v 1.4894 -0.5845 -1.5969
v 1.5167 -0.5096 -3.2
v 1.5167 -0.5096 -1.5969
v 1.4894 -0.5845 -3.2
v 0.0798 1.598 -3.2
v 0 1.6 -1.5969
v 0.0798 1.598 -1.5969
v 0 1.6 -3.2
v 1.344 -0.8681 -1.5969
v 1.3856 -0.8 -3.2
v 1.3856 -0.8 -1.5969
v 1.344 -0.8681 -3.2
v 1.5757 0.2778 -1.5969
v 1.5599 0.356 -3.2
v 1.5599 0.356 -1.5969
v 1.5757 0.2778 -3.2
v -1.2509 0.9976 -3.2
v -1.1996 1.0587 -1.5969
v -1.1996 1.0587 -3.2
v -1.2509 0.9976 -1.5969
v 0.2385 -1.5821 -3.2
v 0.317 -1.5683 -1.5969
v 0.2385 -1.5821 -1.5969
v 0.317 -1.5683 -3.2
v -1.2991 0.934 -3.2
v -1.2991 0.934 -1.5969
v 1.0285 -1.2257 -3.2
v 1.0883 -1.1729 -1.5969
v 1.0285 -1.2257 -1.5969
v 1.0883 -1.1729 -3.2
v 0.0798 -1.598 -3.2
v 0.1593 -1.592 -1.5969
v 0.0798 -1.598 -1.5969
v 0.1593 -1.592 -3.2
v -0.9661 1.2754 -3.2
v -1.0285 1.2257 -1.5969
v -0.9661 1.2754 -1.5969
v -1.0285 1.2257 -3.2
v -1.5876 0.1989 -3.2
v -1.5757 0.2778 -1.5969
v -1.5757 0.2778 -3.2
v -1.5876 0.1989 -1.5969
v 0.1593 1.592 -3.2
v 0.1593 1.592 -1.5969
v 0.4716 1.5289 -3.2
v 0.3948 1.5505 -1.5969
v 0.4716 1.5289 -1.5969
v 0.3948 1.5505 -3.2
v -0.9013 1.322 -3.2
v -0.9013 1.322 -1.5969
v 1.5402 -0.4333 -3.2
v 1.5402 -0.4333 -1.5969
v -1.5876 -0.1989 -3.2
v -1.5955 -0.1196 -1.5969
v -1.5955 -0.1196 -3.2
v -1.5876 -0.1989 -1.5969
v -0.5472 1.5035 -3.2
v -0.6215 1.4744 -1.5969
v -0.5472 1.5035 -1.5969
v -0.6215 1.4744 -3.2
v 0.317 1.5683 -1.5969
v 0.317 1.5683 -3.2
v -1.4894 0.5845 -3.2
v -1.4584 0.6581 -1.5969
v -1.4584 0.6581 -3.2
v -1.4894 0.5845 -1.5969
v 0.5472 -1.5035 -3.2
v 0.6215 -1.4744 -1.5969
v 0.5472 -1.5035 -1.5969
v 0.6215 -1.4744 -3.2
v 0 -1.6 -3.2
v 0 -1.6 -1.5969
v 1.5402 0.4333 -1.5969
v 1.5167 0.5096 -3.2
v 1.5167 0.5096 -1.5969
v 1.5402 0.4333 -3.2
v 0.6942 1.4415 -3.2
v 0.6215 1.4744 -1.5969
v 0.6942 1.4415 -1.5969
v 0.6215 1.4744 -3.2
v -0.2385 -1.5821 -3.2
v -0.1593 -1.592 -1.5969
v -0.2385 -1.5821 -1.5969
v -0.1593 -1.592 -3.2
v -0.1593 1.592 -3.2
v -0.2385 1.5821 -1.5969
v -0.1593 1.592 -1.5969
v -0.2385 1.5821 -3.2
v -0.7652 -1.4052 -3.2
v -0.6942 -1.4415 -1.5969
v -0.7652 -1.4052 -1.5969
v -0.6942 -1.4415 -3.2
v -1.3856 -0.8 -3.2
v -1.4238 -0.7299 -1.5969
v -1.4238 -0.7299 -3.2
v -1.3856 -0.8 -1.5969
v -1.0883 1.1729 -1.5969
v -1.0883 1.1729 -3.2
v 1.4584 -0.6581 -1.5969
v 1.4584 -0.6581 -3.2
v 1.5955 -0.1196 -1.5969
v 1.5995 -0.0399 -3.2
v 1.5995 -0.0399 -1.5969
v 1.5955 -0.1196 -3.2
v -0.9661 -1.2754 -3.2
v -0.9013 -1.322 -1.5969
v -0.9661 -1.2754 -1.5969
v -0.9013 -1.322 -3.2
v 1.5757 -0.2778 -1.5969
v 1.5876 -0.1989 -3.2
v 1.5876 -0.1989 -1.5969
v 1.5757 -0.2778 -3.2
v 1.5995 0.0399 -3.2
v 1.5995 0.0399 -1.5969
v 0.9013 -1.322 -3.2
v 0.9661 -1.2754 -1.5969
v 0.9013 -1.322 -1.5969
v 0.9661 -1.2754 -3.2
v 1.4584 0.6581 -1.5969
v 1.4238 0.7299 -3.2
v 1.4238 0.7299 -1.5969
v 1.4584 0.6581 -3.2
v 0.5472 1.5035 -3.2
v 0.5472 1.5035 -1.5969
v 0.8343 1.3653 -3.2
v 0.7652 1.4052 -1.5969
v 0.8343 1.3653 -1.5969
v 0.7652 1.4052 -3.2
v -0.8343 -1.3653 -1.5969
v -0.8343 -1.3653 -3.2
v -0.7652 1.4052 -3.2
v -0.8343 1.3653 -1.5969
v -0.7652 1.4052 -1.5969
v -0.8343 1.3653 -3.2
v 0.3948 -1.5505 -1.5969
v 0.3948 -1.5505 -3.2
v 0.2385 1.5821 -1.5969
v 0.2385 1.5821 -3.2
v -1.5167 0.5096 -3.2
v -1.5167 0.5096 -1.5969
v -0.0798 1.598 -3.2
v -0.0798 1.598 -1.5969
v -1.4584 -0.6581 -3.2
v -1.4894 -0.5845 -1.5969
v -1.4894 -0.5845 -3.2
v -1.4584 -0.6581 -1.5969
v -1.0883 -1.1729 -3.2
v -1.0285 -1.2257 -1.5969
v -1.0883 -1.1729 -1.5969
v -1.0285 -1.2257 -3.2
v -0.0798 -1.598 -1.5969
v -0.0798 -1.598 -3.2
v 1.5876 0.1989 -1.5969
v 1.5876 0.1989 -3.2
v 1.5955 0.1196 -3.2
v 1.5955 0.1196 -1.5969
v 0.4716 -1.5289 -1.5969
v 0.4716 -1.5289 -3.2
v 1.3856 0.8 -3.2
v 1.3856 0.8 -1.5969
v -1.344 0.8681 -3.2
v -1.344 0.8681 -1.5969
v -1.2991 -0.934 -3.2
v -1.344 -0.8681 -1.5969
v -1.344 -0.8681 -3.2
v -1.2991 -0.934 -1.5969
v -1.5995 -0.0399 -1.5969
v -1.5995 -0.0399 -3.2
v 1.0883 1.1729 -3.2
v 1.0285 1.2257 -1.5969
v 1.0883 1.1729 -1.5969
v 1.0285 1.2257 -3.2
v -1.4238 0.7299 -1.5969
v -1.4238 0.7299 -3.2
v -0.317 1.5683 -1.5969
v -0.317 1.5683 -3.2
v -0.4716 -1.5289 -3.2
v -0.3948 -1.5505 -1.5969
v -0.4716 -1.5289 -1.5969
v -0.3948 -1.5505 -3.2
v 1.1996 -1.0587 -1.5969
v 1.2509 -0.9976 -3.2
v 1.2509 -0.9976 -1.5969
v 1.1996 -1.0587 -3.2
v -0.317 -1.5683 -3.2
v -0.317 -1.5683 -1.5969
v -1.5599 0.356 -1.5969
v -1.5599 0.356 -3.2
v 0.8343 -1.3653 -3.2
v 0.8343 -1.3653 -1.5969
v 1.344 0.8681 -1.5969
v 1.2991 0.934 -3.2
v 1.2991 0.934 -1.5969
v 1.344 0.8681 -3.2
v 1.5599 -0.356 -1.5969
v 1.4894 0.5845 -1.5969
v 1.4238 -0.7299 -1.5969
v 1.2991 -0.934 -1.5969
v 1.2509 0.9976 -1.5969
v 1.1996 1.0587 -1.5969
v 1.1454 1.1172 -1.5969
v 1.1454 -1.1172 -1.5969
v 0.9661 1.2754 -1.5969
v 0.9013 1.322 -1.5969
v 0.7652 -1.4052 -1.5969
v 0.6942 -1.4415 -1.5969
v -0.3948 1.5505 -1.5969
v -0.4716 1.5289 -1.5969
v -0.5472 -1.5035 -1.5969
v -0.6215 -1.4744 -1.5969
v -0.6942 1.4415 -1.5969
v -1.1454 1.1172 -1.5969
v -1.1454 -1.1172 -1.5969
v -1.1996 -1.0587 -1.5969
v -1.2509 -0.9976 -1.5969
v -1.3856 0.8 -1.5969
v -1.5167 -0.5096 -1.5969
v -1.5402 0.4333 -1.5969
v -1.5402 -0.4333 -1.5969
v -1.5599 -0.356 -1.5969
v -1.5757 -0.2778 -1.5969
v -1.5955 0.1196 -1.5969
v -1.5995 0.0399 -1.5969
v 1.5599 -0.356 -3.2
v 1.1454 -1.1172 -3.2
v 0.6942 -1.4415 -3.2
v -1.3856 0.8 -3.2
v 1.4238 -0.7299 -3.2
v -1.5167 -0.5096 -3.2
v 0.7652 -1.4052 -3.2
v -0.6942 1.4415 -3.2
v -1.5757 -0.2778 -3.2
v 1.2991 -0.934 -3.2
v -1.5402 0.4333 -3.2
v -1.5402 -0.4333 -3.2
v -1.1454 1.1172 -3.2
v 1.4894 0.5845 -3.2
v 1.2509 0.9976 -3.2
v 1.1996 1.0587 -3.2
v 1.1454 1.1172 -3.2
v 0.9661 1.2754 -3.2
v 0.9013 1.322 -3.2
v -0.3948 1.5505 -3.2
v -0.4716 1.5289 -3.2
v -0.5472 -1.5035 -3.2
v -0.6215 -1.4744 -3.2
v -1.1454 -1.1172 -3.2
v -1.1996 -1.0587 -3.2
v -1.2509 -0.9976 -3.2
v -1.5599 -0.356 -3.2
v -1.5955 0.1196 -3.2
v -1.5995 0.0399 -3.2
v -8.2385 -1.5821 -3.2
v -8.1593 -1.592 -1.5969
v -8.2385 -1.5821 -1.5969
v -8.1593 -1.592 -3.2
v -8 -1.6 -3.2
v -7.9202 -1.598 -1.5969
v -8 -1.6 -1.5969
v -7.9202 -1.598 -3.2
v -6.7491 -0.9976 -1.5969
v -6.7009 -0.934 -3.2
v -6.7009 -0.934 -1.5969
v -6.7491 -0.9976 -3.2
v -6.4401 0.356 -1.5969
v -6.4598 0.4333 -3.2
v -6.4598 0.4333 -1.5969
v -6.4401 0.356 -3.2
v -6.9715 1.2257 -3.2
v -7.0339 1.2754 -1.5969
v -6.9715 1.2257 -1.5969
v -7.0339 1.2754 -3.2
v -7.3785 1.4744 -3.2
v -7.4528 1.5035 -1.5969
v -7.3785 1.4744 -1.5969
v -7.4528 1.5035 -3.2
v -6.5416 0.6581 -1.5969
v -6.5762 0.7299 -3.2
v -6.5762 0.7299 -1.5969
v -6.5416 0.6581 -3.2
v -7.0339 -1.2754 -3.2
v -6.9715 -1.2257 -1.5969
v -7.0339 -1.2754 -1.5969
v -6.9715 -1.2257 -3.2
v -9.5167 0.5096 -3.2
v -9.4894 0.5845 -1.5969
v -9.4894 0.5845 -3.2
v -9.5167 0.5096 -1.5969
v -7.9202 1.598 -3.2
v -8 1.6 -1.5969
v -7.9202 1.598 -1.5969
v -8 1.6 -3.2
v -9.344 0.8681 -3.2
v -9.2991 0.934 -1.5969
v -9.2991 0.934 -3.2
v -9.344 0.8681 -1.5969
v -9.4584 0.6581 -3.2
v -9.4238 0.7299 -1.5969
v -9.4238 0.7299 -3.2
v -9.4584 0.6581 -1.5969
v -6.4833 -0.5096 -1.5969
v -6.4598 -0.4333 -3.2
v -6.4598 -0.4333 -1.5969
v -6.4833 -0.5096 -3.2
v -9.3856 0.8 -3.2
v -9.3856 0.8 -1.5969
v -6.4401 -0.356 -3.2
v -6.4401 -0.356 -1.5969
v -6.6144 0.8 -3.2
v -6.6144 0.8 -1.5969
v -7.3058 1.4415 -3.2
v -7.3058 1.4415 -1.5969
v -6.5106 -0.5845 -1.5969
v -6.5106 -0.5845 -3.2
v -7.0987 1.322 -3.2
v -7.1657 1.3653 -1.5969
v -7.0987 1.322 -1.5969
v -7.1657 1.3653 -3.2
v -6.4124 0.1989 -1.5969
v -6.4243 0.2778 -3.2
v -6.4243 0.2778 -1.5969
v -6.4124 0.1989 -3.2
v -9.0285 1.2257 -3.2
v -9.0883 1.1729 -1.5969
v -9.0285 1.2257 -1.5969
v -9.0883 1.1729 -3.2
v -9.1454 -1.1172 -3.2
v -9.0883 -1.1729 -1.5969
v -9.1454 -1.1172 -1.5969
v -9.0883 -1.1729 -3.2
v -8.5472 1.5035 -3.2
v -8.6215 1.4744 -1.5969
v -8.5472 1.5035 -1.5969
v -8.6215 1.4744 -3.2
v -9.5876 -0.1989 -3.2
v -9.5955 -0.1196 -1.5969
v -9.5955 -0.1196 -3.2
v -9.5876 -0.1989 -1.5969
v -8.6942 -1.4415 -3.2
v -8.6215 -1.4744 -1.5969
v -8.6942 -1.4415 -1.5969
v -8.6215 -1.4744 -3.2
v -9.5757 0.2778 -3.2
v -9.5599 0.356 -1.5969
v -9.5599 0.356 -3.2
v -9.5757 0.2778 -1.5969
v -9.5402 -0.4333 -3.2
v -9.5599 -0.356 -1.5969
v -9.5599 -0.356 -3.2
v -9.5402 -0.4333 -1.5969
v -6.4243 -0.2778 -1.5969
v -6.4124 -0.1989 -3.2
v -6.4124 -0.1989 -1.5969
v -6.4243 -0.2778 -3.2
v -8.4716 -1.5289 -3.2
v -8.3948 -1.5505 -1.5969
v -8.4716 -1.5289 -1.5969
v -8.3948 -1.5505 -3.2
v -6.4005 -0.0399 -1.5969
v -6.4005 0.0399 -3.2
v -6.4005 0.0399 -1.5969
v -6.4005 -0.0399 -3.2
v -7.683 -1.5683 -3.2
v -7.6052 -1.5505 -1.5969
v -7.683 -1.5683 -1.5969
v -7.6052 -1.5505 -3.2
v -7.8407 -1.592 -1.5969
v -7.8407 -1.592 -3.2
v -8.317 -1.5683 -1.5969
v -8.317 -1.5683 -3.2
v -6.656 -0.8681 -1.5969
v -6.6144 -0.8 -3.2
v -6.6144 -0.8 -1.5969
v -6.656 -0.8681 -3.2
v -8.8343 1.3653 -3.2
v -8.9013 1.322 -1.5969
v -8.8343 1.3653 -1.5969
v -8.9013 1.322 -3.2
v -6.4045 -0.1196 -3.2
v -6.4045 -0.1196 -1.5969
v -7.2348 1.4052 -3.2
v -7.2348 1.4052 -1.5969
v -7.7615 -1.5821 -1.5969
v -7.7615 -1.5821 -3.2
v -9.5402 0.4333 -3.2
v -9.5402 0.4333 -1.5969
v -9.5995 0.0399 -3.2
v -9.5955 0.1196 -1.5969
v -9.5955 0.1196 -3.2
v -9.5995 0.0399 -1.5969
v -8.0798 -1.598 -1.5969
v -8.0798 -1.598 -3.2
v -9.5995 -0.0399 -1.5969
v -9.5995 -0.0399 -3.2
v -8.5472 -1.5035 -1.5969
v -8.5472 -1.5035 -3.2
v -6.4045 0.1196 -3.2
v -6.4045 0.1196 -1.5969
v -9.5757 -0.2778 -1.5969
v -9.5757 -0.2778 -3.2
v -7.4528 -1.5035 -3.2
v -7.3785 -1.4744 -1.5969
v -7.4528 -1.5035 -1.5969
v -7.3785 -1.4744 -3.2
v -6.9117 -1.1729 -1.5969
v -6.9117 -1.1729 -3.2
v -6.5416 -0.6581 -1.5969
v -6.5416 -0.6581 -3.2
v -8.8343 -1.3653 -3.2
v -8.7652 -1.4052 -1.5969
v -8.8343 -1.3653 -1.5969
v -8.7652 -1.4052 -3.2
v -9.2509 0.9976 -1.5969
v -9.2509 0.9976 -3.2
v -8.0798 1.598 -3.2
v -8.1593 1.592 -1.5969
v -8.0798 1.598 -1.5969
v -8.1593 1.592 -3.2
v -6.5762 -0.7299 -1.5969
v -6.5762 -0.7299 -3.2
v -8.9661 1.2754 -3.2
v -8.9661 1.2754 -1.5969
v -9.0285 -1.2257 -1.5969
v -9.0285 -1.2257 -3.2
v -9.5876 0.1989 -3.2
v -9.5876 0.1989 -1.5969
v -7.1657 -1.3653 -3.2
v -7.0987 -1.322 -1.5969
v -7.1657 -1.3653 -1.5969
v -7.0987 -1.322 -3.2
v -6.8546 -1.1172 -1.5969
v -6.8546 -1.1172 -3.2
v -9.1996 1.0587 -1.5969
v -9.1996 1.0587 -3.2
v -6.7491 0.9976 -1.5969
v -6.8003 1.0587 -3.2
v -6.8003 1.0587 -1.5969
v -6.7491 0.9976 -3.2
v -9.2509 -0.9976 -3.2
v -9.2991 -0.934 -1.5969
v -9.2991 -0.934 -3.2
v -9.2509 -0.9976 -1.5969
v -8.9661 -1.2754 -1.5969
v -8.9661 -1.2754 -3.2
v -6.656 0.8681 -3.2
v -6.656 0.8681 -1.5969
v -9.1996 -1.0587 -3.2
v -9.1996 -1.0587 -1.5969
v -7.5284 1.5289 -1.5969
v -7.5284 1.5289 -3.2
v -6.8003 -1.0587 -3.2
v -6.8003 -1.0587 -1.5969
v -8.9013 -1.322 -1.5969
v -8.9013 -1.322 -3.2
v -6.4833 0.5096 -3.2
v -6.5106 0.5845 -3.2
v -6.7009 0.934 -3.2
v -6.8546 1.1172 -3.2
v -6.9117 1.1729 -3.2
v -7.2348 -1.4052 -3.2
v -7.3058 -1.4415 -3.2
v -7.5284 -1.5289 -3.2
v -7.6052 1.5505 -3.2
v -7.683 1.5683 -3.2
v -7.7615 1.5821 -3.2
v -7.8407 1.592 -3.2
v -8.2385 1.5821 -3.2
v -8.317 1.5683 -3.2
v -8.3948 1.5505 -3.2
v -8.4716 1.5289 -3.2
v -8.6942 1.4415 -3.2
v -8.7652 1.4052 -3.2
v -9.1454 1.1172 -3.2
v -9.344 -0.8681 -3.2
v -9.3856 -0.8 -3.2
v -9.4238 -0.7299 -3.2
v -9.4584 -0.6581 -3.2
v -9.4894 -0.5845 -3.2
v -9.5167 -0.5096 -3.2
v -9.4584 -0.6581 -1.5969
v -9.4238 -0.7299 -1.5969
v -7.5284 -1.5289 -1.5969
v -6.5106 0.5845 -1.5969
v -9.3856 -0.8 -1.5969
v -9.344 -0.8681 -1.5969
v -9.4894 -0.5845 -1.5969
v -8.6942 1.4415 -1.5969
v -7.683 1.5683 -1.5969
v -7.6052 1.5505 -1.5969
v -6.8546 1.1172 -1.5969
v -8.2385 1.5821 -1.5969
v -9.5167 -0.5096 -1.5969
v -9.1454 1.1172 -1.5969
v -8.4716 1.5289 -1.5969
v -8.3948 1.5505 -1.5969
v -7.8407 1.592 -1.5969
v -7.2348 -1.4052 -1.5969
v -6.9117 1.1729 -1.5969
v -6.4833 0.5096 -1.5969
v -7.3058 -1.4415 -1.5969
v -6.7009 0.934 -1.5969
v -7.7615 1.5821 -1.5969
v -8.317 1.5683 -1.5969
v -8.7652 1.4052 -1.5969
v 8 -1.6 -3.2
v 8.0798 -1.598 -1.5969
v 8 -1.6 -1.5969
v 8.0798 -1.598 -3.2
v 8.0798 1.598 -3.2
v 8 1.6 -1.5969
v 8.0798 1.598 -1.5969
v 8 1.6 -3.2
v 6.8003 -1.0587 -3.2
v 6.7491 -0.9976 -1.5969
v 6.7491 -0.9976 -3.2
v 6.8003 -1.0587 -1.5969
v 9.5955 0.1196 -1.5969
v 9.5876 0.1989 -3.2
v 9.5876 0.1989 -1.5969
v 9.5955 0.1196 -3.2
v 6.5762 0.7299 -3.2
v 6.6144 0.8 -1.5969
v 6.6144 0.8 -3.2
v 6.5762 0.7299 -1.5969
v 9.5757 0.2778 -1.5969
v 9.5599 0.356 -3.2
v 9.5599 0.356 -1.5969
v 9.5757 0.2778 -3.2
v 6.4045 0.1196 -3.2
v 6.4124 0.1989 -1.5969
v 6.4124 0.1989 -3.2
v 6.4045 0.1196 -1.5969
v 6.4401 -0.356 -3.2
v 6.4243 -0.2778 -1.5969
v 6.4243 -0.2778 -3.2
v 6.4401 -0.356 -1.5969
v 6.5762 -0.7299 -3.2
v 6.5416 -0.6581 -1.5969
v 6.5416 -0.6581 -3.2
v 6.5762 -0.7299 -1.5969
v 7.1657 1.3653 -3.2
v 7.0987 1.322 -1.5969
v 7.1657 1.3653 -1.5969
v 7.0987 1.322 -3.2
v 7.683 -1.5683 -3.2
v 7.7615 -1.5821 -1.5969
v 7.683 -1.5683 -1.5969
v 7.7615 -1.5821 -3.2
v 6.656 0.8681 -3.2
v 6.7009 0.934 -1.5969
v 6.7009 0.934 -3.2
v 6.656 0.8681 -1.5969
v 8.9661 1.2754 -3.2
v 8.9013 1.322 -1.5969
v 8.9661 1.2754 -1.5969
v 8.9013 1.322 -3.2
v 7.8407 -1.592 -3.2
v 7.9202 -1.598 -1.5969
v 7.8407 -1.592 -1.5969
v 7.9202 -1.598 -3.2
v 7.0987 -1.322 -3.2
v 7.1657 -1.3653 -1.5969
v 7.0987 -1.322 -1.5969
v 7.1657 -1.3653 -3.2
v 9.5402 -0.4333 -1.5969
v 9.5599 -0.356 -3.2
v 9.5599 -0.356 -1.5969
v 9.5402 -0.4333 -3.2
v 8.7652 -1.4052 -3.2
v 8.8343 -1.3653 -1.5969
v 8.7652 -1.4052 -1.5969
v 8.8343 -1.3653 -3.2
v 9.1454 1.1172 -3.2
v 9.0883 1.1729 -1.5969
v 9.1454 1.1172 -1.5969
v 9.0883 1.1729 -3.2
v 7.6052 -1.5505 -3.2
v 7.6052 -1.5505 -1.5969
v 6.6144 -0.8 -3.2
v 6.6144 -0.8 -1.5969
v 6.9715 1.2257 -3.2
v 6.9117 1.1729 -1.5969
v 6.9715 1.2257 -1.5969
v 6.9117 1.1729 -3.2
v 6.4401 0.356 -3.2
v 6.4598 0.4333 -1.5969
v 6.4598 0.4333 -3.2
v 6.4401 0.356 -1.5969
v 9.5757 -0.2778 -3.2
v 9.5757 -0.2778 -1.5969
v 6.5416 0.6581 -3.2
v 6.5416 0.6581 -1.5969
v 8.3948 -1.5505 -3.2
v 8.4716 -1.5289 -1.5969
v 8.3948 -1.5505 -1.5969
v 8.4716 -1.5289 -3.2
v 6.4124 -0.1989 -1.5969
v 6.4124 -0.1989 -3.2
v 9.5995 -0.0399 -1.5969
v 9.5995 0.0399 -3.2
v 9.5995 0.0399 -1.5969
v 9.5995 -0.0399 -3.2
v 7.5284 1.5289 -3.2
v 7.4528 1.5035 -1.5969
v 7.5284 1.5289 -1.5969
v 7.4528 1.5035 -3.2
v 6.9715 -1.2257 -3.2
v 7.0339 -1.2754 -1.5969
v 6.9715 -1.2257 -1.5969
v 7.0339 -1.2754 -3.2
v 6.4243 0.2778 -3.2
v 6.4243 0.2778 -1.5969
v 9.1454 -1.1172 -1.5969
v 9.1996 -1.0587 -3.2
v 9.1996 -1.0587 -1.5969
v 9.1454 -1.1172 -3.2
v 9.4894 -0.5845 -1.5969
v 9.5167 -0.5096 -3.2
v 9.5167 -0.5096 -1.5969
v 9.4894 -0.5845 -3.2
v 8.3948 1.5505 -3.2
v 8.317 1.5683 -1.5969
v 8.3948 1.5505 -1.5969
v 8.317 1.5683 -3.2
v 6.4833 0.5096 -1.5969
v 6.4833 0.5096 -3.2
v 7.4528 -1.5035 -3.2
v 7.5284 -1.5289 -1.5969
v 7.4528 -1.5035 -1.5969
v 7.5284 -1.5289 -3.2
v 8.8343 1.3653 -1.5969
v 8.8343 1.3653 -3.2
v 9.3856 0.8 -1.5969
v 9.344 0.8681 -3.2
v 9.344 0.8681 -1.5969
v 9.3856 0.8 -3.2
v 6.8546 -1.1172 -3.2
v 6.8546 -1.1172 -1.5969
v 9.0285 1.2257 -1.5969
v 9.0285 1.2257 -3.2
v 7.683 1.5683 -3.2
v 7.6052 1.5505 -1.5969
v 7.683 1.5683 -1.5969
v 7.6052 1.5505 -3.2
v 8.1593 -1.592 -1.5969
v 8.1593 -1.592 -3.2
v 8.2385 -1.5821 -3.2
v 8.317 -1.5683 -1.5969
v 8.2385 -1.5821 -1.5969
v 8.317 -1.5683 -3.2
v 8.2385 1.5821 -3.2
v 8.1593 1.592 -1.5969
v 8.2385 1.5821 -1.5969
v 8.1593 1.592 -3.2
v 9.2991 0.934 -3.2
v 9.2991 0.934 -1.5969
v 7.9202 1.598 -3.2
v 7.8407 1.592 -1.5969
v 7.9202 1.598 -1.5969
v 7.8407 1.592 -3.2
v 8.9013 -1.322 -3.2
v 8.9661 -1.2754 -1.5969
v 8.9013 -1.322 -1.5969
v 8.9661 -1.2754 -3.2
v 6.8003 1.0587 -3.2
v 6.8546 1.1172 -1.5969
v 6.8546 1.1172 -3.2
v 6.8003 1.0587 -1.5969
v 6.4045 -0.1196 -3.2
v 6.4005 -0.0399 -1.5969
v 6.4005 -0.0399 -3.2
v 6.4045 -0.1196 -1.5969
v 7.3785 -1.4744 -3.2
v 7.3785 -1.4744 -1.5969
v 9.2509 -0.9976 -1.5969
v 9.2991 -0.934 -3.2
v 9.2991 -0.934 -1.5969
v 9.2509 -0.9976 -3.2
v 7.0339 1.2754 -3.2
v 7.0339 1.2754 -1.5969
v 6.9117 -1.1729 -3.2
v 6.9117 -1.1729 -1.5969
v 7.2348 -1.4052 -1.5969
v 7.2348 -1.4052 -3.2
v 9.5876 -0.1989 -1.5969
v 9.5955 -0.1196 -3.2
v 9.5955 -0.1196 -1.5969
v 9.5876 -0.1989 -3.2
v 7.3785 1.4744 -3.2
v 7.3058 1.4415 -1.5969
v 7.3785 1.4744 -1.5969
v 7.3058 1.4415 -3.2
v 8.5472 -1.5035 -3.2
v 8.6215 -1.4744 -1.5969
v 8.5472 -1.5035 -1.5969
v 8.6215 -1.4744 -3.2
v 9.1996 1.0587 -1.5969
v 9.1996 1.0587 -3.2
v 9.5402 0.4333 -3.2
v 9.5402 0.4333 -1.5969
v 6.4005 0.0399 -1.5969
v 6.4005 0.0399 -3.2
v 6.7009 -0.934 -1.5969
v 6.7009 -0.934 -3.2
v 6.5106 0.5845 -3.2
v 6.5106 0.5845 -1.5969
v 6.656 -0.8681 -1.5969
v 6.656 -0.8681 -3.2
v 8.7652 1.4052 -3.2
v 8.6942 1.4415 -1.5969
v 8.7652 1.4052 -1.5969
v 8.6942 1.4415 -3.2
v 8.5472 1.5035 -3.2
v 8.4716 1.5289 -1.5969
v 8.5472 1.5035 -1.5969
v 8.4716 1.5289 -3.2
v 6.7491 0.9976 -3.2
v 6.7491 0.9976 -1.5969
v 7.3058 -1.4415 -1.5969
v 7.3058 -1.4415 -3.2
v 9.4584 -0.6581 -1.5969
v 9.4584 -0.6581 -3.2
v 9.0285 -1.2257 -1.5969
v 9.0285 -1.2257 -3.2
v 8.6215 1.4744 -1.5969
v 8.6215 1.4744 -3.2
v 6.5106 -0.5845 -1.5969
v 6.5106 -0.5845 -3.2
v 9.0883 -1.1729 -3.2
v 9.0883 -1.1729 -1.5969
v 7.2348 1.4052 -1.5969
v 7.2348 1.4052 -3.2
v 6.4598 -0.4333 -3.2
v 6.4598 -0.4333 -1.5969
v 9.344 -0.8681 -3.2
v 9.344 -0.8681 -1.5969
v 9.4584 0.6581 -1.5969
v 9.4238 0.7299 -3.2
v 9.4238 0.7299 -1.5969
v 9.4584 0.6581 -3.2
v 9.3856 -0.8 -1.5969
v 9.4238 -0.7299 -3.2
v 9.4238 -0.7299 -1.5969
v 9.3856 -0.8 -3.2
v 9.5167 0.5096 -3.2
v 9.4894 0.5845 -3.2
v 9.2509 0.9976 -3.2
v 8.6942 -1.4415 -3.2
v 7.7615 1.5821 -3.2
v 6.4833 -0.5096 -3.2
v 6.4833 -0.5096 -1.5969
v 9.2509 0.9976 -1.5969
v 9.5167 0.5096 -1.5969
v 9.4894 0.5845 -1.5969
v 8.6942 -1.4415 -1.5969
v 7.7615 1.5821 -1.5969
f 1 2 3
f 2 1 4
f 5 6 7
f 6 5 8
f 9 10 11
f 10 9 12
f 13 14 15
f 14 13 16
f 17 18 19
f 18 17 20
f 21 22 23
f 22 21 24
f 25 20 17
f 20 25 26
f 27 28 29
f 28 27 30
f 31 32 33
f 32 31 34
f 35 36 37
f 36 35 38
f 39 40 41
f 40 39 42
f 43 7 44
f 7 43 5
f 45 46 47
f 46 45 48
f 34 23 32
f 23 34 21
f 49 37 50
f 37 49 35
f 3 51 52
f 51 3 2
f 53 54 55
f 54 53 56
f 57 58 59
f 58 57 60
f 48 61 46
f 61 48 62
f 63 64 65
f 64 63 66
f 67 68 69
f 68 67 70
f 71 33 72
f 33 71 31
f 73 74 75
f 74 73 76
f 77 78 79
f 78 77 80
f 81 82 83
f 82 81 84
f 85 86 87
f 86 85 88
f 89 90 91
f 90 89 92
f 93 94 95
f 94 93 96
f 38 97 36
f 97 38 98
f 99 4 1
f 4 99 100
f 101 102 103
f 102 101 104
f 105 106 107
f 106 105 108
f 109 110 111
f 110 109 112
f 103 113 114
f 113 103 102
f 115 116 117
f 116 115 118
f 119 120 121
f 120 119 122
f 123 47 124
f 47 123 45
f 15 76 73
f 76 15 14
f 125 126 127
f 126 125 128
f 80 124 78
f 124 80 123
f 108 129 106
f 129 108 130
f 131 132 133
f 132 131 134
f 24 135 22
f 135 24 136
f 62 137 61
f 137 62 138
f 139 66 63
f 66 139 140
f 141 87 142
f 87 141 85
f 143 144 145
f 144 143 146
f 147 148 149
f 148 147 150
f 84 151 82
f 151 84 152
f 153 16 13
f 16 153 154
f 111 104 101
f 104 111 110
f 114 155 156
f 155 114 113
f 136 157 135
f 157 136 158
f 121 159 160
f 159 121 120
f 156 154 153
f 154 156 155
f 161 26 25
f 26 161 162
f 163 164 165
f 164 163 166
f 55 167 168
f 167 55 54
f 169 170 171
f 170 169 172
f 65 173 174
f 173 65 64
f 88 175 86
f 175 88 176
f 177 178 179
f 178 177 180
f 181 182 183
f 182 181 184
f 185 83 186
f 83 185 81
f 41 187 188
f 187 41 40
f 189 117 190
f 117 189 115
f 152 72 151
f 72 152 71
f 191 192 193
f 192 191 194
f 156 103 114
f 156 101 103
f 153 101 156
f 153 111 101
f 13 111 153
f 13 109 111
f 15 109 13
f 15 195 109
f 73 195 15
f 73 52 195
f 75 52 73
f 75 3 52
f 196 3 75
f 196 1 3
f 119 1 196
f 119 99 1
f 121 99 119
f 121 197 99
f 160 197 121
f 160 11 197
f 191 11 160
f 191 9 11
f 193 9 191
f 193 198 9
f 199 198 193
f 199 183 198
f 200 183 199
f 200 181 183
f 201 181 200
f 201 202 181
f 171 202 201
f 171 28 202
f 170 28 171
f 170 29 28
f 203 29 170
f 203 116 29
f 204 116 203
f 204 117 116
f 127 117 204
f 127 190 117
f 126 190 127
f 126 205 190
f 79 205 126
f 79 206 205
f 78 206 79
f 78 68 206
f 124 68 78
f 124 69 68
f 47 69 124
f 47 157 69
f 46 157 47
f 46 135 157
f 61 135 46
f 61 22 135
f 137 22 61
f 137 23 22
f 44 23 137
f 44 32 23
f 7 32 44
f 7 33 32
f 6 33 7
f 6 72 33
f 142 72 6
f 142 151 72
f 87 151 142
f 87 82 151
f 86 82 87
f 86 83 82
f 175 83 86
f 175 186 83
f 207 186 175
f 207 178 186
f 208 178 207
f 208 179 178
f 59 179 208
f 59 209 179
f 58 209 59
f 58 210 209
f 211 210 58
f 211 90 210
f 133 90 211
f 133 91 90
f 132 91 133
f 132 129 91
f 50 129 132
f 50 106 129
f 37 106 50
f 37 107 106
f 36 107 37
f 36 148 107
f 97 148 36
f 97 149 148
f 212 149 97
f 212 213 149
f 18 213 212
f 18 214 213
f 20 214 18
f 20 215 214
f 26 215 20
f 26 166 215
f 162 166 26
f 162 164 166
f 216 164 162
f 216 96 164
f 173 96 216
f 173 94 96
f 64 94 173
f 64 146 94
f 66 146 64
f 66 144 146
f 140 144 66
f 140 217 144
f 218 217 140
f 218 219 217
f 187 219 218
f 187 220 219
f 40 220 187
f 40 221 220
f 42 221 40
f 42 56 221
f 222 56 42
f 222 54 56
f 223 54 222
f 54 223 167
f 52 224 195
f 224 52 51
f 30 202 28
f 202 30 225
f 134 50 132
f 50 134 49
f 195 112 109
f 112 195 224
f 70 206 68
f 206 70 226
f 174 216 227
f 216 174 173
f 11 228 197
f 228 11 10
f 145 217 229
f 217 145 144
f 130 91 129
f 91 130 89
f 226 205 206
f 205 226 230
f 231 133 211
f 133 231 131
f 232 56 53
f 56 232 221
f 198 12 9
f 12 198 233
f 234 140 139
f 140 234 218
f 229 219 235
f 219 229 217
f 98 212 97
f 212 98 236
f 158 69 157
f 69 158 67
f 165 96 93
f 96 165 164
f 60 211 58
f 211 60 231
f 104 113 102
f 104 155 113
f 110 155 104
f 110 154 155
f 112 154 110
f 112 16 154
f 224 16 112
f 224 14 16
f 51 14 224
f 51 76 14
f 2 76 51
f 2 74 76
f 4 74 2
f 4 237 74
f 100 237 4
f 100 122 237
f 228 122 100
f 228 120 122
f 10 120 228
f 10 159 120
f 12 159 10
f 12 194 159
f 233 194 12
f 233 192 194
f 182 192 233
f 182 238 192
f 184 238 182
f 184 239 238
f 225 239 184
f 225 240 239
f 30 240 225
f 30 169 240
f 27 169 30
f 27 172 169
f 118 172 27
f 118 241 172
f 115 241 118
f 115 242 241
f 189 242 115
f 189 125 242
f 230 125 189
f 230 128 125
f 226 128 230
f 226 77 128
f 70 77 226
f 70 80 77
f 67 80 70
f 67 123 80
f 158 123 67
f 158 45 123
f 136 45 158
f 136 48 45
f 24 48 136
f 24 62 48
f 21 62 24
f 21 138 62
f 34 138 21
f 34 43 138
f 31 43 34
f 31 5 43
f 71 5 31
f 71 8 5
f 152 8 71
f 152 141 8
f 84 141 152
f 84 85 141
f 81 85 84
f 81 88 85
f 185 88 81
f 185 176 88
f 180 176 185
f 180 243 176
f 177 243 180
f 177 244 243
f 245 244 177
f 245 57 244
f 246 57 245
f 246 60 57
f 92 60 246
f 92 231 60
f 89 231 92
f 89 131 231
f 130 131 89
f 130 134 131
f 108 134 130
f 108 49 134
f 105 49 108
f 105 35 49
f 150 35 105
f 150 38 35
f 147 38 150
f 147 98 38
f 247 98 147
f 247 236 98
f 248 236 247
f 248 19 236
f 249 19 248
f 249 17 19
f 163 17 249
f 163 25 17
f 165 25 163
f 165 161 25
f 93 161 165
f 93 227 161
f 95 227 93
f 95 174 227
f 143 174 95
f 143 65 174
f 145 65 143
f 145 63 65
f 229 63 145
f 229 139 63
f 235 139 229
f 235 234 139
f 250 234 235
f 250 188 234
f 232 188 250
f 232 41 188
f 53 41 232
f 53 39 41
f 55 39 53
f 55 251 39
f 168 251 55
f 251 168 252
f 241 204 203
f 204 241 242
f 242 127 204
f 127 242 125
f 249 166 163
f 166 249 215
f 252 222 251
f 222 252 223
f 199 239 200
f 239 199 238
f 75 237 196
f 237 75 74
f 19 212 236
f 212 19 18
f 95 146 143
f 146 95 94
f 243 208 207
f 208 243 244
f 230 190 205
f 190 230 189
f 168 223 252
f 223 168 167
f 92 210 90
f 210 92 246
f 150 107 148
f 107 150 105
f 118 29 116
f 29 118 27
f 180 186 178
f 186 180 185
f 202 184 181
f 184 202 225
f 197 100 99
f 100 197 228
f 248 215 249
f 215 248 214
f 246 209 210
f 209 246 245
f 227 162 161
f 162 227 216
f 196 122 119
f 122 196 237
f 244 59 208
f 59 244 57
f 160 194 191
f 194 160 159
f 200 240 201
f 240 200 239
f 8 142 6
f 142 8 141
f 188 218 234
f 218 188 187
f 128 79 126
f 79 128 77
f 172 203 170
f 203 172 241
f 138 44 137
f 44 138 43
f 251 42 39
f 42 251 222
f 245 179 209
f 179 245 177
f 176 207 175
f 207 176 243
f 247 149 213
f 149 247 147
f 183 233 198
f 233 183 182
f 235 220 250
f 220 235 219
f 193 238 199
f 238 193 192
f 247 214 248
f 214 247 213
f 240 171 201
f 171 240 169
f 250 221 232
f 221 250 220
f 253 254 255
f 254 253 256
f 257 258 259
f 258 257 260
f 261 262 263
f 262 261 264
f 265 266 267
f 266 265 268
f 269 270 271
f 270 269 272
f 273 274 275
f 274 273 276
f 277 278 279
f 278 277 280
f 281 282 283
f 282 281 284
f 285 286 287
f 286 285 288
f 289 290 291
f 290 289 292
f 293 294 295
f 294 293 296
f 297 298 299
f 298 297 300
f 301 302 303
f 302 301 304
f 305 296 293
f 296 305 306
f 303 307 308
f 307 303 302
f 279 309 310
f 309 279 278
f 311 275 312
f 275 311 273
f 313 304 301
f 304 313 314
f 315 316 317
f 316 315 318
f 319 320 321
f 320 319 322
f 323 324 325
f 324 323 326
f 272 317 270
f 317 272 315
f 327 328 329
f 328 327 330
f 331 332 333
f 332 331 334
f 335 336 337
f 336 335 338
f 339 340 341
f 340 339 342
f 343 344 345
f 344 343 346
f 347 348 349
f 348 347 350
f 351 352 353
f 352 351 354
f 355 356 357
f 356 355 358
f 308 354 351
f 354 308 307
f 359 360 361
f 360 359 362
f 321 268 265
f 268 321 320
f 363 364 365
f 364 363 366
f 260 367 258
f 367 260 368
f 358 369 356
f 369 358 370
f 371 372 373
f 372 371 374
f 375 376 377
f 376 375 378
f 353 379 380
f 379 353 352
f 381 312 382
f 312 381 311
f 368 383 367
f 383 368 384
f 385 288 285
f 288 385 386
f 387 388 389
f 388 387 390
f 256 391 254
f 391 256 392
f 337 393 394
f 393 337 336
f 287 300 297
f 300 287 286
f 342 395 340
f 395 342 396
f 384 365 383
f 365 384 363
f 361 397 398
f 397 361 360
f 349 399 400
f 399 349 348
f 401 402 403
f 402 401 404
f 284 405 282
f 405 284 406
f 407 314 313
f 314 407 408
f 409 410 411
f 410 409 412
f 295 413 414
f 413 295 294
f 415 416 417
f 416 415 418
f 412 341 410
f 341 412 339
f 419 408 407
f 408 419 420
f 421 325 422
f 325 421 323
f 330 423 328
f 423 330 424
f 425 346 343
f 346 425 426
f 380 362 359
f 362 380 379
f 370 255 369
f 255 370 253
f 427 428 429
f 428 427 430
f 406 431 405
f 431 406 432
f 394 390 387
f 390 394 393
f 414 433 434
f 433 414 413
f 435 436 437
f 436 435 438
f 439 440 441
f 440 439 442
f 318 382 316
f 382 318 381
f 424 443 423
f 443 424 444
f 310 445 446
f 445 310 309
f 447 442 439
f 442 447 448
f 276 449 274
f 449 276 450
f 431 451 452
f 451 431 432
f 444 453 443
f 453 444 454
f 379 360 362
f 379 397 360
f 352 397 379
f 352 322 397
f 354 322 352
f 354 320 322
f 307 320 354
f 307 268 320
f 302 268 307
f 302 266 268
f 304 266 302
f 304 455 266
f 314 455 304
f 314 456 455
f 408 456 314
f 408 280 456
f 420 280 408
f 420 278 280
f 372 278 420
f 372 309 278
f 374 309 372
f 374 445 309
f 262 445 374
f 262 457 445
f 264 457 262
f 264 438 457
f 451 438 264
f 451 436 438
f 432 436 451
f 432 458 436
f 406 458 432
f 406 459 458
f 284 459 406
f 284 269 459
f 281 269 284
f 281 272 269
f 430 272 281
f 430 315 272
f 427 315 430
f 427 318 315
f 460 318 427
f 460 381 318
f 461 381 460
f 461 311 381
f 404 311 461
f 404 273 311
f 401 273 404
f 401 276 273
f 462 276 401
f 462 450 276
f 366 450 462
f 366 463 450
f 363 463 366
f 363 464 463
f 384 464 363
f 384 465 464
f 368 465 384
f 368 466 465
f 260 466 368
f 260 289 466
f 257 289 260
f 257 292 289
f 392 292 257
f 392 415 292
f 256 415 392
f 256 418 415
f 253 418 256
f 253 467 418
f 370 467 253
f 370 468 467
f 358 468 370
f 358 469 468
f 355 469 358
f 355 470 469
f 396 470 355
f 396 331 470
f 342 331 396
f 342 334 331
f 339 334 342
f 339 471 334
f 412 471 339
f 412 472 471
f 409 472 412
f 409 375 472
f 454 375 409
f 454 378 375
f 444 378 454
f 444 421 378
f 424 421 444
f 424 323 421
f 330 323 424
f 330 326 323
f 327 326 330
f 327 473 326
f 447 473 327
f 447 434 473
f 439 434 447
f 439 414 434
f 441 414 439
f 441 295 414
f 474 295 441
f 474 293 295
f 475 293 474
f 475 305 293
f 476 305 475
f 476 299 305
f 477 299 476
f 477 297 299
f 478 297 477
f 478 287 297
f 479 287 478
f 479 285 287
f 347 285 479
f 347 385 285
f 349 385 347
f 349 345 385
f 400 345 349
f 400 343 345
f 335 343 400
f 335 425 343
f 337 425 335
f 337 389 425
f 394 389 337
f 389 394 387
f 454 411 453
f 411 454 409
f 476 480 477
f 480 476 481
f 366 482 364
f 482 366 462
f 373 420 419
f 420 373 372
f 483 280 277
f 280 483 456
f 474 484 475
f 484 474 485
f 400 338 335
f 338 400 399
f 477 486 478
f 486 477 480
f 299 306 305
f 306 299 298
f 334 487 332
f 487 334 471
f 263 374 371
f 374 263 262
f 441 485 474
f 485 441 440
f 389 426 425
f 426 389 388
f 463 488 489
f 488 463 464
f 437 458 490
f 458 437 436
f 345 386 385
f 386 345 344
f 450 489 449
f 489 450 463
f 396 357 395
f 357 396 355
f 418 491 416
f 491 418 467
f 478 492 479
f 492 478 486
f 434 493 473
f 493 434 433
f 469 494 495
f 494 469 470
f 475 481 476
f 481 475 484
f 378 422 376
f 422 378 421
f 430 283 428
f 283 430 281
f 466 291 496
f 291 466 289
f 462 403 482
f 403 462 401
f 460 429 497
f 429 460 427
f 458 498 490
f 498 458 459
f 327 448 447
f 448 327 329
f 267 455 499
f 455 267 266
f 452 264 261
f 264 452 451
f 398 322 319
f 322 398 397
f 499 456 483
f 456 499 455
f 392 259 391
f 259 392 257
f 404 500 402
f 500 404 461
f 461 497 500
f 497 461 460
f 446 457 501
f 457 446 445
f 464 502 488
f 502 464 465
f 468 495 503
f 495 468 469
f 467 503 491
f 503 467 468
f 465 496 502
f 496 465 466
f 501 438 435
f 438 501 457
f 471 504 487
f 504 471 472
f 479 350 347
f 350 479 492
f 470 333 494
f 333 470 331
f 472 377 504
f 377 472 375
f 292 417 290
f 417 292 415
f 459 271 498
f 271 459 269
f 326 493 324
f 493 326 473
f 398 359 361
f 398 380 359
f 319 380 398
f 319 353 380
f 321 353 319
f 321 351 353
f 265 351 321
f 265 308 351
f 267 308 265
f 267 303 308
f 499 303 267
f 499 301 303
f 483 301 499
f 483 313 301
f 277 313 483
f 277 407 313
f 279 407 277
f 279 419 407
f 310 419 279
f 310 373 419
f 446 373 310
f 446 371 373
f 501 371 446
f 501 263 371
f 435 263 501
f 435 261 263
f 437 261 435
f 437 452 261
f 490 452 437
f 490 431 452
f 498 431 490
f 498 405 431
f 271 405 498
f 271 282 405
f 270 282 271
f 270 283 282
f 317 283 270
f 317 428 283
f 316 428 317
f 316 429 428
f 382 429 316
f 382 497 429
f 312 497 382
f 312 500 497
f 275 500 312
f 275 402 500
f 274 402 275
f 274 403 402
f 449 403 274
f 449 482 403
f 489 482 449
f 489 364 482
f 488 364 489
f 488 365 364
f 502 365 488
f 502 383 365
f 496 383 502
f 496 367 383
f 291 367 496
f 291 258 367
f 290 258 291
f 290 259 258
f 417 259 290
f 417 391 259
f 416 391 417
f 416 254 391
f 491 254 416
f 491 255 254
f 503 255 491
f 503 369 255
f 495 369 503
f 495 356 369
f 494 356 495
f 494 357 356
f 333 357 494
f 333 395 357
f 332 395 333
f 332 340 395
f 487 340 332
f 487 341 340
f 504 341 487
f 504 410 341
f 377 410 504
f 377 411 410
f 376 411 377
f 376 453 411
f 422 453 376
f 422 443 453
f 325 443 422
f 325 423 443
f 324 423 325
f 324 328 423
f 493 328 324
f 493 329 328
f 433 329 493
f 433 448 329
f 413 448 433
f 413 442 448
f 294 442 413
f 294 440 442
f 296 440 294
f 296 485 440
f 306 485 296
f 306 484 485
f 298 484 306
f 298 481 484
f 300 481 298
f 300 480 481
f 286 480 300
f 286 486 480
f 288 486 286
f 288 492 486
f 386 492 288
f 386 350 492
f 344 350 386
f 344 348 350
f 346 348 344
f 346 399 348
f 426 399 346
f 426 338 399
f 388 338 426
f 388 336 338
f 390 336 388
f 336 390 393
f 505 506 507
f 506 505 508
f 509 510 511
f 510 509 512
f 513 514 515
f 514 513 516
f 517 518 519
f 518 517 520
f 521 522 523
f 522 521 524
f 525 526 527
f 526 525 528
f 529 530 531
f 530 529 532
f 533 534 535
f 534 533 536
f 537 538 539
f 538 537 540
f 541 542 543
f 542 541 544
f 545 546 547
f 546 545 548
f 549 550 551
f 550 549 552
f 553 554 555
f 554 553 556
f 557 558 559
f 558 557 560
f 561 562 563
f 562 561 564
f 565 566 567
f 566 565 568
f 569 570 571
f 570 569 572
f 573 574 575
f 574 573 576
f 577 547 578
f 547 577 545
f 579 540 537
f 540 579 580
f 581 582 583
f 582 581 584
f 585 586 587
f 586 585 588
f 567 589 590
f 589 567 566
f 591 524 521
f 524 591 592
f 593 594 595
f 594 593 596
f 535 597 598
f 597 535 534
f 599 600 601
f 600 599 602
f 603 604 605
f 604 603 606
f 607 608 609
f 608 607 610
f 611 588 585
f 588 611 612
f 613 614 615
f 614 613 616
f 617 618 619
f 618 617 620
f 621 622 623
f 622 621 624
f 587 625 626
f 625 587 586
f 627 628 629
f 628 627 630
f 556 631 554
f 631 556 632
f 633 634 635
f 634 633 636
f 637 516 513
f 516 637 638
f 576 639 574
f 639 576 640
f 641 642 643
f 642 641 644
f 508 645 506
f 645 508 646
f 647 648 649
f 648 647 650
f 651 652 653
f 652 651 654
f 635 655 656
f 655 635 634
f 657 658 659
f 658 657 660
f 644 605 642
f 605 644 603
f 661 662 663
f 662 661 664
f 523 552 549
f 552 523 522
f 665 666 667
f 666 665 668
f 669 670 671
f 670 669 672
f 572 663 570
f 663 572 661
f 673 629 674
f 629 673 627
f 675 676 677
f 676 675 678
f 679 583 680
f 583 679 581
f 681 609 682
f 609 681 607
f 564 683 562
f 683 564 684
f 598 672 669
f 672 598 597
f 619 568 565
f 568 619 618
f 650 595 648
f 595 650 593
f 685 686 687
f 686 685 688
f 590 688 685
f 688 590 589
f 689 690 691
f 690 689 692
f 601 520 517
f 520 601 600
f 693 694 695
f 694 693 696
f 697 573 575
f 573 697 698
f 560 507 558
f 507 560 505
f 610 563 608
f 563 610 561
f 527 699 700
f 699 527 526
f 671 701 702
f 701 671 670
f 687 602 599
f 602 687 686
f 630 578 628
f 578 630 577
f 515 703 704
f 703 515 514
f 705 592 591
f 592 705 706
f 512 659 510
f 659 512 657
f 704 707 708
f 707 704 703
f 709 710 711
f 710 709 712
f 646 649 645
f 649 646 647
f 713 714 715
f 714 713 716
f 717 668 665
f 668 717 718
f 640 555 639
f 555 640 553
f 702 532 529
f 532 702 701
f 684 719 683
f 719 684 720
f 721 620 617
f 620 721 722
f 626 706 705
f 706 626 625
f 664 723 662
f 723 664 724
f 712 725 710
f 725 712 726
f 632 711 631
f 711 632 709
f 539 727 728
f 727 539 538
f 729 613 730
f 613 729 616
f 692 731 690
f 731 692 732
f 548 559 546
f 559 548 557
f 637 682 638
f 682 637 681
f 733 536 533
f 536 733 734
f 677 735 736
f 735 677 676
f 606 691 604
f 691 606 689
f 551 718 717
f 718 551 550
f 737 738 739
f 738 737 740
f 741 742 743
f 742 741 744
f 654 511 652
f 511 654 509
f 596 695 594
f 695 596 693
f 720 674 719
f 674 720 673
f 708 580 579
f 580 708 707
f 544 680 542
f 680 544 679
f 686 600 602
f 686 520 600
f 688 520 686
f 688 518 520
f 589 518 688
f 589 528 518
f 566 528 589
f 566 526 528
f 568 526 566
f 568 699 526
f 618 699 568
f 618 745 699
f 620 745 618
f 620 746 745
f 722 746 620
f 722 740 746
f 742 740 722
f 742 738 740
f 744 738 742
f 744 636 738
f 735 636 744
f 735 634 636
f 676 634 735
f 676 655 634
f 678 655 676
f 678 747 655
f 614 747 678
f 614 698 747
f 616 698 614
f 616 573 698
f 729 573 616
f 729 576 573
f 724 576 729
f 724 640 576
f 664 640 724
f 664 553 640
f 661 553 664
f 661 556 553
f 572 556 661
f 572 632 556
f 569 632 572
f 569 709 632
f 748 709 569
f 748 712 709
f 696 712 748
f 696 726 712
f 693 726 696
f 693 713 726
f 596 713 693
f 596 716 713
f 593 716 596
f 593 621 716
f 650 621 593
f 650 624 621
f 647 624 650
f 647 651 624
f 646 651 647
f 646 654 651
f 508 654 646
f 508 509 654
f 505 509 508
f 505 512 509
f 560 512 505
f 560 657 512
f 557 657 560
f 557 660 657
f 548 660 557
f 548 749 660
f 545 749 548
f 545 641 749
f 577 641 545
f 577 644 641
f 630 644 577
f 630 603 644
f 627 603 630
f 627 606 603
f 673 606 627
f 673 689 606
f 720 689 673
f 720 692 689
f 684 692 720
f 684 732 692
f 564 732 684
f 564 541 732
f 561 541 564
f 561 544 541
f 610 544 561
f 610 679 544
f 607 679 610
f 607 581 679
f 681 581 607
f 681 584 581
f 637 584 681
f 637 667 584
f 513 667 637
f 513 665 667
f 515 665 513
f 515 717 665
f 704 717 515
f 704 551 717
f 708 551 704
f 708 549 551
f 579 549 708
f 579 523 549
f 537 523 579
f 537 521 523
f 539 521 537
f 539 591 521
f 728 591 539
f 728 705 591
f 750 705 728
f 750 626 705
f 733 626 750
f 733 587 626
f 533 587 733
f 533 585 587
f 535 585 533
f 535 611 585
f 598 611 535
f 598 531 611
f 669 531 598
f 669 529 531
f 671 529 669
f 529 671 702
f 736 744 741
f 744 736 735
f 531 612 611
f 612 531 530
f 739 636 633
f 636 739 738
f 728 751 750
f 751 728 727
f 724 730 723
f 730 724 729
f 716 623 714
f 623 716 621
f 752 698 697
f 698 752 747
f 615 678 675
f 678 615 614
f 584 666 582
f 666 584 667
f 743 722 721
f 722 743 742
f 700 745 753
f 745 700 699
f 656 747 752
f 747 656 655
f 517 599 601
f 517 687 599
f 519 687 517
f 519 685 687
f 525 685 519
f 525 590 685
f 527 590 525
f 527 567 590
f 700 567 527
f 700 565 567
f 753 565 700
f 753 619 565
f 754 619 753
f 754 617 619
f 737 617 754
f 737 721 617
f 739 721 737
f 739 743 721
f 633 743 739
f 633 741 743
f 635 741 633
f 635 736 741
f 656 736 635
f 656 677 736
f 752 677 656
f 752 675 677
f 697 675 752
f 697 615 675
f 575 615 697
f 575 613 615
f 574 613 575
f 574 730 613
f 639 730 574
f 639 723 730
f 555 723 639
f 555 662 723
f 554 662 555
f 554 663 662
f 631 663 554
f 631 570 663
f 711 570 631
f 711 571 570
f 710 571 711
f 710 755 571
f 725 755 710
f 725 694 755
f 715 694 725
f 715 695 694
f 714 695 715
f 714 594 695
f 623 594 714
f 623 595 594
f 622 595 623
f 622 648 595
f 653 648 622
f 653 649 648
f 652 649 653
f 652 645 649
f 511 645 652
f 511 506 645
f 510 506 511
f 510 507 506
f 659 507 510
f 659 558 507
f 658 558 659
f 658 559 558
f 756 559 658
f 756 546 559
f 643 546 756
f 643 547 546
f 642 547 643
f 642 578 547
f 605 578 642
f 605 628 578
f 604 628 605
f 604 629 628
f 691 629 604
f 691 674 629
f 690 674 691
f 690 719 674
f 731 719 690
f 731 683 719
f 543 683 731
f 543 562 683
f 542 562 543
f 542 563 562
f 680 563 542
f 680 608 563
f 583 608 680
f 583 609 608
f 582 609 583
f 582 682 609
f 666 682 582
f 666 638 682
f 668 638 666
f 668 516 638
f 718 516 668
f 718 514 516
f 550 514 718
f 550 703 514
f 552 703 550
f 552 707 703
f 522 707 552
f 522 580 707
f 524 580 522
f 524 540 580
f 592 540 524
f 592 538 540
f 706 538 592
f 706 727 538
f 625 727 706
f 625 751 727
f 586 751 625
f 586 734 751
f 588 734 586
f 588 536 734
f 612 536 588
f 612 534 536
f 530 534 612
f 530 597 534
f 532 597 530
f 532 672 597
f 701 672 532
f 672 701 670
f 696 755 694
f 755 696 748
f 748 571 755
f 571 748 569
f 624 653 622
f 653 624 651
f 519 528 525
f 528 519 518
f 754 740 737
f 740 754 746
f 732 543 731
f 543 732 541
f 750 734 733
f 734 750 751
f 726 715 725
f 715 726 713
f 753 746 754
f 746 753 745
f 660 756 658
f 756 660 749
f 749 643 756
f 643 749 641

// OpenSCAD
use <../lib.scad>
use <2431.scad>
use <6258203i.scad>
$fa=1; $fs=0.2;
function ldraw_lib__2431dt3(realsolid=false) = [
// 0 Tile  1 x  4 with German Rear License Plate "K AM58IH" Sticker
// 0 Name: 2431dt3.dat
// 0 Author: Ulrich Röder [UR]
// 0 !LDRAW_ORG Shortcut UPDATE 2019-01
// 0 !LICENSE Licensed under CC BY 2.0 and CC BY 4.0 : see CAreadme.txt
// 
// 0 BFC CERTIFY CCW
  [0,"BFC","CERTIFY"],
  [0,"BFC","CCW"],
// 
// 0 !KEYWORDS Ford, Mustang, Set 10265
// 
// 0 !HISTORY 2019-06-28 [PTadmin] Official Update 2019-01
// 
// 
// 1 16 0 0 0 1 0 0 0 1 0 0 0 1 2431.dat
  [1,16,0,0,0,1,0,0,0,1,0,0,0,1, ldraw_lib__2431(realsolid)],
// 1 16 0 0 0 1 0 0 0 1 0 0 0 1 6258203i.dat
  [1,16,0,0,0,1,0,0,0,1,0,0,0,1, ldraw_lib__6258203i(realsolid)],
];
module ldraw_lib__2431dt3(step=0, col=false, unit=2/5, alt=false, line=0.2, solid=!$preview)
    makepoly(ldraw_lib__2431dt3(solid), step=step, col=col, unit=unit, alt=alt, line=line, solid=solid);
ldraw_lib__2431dt3(line=0.2);
